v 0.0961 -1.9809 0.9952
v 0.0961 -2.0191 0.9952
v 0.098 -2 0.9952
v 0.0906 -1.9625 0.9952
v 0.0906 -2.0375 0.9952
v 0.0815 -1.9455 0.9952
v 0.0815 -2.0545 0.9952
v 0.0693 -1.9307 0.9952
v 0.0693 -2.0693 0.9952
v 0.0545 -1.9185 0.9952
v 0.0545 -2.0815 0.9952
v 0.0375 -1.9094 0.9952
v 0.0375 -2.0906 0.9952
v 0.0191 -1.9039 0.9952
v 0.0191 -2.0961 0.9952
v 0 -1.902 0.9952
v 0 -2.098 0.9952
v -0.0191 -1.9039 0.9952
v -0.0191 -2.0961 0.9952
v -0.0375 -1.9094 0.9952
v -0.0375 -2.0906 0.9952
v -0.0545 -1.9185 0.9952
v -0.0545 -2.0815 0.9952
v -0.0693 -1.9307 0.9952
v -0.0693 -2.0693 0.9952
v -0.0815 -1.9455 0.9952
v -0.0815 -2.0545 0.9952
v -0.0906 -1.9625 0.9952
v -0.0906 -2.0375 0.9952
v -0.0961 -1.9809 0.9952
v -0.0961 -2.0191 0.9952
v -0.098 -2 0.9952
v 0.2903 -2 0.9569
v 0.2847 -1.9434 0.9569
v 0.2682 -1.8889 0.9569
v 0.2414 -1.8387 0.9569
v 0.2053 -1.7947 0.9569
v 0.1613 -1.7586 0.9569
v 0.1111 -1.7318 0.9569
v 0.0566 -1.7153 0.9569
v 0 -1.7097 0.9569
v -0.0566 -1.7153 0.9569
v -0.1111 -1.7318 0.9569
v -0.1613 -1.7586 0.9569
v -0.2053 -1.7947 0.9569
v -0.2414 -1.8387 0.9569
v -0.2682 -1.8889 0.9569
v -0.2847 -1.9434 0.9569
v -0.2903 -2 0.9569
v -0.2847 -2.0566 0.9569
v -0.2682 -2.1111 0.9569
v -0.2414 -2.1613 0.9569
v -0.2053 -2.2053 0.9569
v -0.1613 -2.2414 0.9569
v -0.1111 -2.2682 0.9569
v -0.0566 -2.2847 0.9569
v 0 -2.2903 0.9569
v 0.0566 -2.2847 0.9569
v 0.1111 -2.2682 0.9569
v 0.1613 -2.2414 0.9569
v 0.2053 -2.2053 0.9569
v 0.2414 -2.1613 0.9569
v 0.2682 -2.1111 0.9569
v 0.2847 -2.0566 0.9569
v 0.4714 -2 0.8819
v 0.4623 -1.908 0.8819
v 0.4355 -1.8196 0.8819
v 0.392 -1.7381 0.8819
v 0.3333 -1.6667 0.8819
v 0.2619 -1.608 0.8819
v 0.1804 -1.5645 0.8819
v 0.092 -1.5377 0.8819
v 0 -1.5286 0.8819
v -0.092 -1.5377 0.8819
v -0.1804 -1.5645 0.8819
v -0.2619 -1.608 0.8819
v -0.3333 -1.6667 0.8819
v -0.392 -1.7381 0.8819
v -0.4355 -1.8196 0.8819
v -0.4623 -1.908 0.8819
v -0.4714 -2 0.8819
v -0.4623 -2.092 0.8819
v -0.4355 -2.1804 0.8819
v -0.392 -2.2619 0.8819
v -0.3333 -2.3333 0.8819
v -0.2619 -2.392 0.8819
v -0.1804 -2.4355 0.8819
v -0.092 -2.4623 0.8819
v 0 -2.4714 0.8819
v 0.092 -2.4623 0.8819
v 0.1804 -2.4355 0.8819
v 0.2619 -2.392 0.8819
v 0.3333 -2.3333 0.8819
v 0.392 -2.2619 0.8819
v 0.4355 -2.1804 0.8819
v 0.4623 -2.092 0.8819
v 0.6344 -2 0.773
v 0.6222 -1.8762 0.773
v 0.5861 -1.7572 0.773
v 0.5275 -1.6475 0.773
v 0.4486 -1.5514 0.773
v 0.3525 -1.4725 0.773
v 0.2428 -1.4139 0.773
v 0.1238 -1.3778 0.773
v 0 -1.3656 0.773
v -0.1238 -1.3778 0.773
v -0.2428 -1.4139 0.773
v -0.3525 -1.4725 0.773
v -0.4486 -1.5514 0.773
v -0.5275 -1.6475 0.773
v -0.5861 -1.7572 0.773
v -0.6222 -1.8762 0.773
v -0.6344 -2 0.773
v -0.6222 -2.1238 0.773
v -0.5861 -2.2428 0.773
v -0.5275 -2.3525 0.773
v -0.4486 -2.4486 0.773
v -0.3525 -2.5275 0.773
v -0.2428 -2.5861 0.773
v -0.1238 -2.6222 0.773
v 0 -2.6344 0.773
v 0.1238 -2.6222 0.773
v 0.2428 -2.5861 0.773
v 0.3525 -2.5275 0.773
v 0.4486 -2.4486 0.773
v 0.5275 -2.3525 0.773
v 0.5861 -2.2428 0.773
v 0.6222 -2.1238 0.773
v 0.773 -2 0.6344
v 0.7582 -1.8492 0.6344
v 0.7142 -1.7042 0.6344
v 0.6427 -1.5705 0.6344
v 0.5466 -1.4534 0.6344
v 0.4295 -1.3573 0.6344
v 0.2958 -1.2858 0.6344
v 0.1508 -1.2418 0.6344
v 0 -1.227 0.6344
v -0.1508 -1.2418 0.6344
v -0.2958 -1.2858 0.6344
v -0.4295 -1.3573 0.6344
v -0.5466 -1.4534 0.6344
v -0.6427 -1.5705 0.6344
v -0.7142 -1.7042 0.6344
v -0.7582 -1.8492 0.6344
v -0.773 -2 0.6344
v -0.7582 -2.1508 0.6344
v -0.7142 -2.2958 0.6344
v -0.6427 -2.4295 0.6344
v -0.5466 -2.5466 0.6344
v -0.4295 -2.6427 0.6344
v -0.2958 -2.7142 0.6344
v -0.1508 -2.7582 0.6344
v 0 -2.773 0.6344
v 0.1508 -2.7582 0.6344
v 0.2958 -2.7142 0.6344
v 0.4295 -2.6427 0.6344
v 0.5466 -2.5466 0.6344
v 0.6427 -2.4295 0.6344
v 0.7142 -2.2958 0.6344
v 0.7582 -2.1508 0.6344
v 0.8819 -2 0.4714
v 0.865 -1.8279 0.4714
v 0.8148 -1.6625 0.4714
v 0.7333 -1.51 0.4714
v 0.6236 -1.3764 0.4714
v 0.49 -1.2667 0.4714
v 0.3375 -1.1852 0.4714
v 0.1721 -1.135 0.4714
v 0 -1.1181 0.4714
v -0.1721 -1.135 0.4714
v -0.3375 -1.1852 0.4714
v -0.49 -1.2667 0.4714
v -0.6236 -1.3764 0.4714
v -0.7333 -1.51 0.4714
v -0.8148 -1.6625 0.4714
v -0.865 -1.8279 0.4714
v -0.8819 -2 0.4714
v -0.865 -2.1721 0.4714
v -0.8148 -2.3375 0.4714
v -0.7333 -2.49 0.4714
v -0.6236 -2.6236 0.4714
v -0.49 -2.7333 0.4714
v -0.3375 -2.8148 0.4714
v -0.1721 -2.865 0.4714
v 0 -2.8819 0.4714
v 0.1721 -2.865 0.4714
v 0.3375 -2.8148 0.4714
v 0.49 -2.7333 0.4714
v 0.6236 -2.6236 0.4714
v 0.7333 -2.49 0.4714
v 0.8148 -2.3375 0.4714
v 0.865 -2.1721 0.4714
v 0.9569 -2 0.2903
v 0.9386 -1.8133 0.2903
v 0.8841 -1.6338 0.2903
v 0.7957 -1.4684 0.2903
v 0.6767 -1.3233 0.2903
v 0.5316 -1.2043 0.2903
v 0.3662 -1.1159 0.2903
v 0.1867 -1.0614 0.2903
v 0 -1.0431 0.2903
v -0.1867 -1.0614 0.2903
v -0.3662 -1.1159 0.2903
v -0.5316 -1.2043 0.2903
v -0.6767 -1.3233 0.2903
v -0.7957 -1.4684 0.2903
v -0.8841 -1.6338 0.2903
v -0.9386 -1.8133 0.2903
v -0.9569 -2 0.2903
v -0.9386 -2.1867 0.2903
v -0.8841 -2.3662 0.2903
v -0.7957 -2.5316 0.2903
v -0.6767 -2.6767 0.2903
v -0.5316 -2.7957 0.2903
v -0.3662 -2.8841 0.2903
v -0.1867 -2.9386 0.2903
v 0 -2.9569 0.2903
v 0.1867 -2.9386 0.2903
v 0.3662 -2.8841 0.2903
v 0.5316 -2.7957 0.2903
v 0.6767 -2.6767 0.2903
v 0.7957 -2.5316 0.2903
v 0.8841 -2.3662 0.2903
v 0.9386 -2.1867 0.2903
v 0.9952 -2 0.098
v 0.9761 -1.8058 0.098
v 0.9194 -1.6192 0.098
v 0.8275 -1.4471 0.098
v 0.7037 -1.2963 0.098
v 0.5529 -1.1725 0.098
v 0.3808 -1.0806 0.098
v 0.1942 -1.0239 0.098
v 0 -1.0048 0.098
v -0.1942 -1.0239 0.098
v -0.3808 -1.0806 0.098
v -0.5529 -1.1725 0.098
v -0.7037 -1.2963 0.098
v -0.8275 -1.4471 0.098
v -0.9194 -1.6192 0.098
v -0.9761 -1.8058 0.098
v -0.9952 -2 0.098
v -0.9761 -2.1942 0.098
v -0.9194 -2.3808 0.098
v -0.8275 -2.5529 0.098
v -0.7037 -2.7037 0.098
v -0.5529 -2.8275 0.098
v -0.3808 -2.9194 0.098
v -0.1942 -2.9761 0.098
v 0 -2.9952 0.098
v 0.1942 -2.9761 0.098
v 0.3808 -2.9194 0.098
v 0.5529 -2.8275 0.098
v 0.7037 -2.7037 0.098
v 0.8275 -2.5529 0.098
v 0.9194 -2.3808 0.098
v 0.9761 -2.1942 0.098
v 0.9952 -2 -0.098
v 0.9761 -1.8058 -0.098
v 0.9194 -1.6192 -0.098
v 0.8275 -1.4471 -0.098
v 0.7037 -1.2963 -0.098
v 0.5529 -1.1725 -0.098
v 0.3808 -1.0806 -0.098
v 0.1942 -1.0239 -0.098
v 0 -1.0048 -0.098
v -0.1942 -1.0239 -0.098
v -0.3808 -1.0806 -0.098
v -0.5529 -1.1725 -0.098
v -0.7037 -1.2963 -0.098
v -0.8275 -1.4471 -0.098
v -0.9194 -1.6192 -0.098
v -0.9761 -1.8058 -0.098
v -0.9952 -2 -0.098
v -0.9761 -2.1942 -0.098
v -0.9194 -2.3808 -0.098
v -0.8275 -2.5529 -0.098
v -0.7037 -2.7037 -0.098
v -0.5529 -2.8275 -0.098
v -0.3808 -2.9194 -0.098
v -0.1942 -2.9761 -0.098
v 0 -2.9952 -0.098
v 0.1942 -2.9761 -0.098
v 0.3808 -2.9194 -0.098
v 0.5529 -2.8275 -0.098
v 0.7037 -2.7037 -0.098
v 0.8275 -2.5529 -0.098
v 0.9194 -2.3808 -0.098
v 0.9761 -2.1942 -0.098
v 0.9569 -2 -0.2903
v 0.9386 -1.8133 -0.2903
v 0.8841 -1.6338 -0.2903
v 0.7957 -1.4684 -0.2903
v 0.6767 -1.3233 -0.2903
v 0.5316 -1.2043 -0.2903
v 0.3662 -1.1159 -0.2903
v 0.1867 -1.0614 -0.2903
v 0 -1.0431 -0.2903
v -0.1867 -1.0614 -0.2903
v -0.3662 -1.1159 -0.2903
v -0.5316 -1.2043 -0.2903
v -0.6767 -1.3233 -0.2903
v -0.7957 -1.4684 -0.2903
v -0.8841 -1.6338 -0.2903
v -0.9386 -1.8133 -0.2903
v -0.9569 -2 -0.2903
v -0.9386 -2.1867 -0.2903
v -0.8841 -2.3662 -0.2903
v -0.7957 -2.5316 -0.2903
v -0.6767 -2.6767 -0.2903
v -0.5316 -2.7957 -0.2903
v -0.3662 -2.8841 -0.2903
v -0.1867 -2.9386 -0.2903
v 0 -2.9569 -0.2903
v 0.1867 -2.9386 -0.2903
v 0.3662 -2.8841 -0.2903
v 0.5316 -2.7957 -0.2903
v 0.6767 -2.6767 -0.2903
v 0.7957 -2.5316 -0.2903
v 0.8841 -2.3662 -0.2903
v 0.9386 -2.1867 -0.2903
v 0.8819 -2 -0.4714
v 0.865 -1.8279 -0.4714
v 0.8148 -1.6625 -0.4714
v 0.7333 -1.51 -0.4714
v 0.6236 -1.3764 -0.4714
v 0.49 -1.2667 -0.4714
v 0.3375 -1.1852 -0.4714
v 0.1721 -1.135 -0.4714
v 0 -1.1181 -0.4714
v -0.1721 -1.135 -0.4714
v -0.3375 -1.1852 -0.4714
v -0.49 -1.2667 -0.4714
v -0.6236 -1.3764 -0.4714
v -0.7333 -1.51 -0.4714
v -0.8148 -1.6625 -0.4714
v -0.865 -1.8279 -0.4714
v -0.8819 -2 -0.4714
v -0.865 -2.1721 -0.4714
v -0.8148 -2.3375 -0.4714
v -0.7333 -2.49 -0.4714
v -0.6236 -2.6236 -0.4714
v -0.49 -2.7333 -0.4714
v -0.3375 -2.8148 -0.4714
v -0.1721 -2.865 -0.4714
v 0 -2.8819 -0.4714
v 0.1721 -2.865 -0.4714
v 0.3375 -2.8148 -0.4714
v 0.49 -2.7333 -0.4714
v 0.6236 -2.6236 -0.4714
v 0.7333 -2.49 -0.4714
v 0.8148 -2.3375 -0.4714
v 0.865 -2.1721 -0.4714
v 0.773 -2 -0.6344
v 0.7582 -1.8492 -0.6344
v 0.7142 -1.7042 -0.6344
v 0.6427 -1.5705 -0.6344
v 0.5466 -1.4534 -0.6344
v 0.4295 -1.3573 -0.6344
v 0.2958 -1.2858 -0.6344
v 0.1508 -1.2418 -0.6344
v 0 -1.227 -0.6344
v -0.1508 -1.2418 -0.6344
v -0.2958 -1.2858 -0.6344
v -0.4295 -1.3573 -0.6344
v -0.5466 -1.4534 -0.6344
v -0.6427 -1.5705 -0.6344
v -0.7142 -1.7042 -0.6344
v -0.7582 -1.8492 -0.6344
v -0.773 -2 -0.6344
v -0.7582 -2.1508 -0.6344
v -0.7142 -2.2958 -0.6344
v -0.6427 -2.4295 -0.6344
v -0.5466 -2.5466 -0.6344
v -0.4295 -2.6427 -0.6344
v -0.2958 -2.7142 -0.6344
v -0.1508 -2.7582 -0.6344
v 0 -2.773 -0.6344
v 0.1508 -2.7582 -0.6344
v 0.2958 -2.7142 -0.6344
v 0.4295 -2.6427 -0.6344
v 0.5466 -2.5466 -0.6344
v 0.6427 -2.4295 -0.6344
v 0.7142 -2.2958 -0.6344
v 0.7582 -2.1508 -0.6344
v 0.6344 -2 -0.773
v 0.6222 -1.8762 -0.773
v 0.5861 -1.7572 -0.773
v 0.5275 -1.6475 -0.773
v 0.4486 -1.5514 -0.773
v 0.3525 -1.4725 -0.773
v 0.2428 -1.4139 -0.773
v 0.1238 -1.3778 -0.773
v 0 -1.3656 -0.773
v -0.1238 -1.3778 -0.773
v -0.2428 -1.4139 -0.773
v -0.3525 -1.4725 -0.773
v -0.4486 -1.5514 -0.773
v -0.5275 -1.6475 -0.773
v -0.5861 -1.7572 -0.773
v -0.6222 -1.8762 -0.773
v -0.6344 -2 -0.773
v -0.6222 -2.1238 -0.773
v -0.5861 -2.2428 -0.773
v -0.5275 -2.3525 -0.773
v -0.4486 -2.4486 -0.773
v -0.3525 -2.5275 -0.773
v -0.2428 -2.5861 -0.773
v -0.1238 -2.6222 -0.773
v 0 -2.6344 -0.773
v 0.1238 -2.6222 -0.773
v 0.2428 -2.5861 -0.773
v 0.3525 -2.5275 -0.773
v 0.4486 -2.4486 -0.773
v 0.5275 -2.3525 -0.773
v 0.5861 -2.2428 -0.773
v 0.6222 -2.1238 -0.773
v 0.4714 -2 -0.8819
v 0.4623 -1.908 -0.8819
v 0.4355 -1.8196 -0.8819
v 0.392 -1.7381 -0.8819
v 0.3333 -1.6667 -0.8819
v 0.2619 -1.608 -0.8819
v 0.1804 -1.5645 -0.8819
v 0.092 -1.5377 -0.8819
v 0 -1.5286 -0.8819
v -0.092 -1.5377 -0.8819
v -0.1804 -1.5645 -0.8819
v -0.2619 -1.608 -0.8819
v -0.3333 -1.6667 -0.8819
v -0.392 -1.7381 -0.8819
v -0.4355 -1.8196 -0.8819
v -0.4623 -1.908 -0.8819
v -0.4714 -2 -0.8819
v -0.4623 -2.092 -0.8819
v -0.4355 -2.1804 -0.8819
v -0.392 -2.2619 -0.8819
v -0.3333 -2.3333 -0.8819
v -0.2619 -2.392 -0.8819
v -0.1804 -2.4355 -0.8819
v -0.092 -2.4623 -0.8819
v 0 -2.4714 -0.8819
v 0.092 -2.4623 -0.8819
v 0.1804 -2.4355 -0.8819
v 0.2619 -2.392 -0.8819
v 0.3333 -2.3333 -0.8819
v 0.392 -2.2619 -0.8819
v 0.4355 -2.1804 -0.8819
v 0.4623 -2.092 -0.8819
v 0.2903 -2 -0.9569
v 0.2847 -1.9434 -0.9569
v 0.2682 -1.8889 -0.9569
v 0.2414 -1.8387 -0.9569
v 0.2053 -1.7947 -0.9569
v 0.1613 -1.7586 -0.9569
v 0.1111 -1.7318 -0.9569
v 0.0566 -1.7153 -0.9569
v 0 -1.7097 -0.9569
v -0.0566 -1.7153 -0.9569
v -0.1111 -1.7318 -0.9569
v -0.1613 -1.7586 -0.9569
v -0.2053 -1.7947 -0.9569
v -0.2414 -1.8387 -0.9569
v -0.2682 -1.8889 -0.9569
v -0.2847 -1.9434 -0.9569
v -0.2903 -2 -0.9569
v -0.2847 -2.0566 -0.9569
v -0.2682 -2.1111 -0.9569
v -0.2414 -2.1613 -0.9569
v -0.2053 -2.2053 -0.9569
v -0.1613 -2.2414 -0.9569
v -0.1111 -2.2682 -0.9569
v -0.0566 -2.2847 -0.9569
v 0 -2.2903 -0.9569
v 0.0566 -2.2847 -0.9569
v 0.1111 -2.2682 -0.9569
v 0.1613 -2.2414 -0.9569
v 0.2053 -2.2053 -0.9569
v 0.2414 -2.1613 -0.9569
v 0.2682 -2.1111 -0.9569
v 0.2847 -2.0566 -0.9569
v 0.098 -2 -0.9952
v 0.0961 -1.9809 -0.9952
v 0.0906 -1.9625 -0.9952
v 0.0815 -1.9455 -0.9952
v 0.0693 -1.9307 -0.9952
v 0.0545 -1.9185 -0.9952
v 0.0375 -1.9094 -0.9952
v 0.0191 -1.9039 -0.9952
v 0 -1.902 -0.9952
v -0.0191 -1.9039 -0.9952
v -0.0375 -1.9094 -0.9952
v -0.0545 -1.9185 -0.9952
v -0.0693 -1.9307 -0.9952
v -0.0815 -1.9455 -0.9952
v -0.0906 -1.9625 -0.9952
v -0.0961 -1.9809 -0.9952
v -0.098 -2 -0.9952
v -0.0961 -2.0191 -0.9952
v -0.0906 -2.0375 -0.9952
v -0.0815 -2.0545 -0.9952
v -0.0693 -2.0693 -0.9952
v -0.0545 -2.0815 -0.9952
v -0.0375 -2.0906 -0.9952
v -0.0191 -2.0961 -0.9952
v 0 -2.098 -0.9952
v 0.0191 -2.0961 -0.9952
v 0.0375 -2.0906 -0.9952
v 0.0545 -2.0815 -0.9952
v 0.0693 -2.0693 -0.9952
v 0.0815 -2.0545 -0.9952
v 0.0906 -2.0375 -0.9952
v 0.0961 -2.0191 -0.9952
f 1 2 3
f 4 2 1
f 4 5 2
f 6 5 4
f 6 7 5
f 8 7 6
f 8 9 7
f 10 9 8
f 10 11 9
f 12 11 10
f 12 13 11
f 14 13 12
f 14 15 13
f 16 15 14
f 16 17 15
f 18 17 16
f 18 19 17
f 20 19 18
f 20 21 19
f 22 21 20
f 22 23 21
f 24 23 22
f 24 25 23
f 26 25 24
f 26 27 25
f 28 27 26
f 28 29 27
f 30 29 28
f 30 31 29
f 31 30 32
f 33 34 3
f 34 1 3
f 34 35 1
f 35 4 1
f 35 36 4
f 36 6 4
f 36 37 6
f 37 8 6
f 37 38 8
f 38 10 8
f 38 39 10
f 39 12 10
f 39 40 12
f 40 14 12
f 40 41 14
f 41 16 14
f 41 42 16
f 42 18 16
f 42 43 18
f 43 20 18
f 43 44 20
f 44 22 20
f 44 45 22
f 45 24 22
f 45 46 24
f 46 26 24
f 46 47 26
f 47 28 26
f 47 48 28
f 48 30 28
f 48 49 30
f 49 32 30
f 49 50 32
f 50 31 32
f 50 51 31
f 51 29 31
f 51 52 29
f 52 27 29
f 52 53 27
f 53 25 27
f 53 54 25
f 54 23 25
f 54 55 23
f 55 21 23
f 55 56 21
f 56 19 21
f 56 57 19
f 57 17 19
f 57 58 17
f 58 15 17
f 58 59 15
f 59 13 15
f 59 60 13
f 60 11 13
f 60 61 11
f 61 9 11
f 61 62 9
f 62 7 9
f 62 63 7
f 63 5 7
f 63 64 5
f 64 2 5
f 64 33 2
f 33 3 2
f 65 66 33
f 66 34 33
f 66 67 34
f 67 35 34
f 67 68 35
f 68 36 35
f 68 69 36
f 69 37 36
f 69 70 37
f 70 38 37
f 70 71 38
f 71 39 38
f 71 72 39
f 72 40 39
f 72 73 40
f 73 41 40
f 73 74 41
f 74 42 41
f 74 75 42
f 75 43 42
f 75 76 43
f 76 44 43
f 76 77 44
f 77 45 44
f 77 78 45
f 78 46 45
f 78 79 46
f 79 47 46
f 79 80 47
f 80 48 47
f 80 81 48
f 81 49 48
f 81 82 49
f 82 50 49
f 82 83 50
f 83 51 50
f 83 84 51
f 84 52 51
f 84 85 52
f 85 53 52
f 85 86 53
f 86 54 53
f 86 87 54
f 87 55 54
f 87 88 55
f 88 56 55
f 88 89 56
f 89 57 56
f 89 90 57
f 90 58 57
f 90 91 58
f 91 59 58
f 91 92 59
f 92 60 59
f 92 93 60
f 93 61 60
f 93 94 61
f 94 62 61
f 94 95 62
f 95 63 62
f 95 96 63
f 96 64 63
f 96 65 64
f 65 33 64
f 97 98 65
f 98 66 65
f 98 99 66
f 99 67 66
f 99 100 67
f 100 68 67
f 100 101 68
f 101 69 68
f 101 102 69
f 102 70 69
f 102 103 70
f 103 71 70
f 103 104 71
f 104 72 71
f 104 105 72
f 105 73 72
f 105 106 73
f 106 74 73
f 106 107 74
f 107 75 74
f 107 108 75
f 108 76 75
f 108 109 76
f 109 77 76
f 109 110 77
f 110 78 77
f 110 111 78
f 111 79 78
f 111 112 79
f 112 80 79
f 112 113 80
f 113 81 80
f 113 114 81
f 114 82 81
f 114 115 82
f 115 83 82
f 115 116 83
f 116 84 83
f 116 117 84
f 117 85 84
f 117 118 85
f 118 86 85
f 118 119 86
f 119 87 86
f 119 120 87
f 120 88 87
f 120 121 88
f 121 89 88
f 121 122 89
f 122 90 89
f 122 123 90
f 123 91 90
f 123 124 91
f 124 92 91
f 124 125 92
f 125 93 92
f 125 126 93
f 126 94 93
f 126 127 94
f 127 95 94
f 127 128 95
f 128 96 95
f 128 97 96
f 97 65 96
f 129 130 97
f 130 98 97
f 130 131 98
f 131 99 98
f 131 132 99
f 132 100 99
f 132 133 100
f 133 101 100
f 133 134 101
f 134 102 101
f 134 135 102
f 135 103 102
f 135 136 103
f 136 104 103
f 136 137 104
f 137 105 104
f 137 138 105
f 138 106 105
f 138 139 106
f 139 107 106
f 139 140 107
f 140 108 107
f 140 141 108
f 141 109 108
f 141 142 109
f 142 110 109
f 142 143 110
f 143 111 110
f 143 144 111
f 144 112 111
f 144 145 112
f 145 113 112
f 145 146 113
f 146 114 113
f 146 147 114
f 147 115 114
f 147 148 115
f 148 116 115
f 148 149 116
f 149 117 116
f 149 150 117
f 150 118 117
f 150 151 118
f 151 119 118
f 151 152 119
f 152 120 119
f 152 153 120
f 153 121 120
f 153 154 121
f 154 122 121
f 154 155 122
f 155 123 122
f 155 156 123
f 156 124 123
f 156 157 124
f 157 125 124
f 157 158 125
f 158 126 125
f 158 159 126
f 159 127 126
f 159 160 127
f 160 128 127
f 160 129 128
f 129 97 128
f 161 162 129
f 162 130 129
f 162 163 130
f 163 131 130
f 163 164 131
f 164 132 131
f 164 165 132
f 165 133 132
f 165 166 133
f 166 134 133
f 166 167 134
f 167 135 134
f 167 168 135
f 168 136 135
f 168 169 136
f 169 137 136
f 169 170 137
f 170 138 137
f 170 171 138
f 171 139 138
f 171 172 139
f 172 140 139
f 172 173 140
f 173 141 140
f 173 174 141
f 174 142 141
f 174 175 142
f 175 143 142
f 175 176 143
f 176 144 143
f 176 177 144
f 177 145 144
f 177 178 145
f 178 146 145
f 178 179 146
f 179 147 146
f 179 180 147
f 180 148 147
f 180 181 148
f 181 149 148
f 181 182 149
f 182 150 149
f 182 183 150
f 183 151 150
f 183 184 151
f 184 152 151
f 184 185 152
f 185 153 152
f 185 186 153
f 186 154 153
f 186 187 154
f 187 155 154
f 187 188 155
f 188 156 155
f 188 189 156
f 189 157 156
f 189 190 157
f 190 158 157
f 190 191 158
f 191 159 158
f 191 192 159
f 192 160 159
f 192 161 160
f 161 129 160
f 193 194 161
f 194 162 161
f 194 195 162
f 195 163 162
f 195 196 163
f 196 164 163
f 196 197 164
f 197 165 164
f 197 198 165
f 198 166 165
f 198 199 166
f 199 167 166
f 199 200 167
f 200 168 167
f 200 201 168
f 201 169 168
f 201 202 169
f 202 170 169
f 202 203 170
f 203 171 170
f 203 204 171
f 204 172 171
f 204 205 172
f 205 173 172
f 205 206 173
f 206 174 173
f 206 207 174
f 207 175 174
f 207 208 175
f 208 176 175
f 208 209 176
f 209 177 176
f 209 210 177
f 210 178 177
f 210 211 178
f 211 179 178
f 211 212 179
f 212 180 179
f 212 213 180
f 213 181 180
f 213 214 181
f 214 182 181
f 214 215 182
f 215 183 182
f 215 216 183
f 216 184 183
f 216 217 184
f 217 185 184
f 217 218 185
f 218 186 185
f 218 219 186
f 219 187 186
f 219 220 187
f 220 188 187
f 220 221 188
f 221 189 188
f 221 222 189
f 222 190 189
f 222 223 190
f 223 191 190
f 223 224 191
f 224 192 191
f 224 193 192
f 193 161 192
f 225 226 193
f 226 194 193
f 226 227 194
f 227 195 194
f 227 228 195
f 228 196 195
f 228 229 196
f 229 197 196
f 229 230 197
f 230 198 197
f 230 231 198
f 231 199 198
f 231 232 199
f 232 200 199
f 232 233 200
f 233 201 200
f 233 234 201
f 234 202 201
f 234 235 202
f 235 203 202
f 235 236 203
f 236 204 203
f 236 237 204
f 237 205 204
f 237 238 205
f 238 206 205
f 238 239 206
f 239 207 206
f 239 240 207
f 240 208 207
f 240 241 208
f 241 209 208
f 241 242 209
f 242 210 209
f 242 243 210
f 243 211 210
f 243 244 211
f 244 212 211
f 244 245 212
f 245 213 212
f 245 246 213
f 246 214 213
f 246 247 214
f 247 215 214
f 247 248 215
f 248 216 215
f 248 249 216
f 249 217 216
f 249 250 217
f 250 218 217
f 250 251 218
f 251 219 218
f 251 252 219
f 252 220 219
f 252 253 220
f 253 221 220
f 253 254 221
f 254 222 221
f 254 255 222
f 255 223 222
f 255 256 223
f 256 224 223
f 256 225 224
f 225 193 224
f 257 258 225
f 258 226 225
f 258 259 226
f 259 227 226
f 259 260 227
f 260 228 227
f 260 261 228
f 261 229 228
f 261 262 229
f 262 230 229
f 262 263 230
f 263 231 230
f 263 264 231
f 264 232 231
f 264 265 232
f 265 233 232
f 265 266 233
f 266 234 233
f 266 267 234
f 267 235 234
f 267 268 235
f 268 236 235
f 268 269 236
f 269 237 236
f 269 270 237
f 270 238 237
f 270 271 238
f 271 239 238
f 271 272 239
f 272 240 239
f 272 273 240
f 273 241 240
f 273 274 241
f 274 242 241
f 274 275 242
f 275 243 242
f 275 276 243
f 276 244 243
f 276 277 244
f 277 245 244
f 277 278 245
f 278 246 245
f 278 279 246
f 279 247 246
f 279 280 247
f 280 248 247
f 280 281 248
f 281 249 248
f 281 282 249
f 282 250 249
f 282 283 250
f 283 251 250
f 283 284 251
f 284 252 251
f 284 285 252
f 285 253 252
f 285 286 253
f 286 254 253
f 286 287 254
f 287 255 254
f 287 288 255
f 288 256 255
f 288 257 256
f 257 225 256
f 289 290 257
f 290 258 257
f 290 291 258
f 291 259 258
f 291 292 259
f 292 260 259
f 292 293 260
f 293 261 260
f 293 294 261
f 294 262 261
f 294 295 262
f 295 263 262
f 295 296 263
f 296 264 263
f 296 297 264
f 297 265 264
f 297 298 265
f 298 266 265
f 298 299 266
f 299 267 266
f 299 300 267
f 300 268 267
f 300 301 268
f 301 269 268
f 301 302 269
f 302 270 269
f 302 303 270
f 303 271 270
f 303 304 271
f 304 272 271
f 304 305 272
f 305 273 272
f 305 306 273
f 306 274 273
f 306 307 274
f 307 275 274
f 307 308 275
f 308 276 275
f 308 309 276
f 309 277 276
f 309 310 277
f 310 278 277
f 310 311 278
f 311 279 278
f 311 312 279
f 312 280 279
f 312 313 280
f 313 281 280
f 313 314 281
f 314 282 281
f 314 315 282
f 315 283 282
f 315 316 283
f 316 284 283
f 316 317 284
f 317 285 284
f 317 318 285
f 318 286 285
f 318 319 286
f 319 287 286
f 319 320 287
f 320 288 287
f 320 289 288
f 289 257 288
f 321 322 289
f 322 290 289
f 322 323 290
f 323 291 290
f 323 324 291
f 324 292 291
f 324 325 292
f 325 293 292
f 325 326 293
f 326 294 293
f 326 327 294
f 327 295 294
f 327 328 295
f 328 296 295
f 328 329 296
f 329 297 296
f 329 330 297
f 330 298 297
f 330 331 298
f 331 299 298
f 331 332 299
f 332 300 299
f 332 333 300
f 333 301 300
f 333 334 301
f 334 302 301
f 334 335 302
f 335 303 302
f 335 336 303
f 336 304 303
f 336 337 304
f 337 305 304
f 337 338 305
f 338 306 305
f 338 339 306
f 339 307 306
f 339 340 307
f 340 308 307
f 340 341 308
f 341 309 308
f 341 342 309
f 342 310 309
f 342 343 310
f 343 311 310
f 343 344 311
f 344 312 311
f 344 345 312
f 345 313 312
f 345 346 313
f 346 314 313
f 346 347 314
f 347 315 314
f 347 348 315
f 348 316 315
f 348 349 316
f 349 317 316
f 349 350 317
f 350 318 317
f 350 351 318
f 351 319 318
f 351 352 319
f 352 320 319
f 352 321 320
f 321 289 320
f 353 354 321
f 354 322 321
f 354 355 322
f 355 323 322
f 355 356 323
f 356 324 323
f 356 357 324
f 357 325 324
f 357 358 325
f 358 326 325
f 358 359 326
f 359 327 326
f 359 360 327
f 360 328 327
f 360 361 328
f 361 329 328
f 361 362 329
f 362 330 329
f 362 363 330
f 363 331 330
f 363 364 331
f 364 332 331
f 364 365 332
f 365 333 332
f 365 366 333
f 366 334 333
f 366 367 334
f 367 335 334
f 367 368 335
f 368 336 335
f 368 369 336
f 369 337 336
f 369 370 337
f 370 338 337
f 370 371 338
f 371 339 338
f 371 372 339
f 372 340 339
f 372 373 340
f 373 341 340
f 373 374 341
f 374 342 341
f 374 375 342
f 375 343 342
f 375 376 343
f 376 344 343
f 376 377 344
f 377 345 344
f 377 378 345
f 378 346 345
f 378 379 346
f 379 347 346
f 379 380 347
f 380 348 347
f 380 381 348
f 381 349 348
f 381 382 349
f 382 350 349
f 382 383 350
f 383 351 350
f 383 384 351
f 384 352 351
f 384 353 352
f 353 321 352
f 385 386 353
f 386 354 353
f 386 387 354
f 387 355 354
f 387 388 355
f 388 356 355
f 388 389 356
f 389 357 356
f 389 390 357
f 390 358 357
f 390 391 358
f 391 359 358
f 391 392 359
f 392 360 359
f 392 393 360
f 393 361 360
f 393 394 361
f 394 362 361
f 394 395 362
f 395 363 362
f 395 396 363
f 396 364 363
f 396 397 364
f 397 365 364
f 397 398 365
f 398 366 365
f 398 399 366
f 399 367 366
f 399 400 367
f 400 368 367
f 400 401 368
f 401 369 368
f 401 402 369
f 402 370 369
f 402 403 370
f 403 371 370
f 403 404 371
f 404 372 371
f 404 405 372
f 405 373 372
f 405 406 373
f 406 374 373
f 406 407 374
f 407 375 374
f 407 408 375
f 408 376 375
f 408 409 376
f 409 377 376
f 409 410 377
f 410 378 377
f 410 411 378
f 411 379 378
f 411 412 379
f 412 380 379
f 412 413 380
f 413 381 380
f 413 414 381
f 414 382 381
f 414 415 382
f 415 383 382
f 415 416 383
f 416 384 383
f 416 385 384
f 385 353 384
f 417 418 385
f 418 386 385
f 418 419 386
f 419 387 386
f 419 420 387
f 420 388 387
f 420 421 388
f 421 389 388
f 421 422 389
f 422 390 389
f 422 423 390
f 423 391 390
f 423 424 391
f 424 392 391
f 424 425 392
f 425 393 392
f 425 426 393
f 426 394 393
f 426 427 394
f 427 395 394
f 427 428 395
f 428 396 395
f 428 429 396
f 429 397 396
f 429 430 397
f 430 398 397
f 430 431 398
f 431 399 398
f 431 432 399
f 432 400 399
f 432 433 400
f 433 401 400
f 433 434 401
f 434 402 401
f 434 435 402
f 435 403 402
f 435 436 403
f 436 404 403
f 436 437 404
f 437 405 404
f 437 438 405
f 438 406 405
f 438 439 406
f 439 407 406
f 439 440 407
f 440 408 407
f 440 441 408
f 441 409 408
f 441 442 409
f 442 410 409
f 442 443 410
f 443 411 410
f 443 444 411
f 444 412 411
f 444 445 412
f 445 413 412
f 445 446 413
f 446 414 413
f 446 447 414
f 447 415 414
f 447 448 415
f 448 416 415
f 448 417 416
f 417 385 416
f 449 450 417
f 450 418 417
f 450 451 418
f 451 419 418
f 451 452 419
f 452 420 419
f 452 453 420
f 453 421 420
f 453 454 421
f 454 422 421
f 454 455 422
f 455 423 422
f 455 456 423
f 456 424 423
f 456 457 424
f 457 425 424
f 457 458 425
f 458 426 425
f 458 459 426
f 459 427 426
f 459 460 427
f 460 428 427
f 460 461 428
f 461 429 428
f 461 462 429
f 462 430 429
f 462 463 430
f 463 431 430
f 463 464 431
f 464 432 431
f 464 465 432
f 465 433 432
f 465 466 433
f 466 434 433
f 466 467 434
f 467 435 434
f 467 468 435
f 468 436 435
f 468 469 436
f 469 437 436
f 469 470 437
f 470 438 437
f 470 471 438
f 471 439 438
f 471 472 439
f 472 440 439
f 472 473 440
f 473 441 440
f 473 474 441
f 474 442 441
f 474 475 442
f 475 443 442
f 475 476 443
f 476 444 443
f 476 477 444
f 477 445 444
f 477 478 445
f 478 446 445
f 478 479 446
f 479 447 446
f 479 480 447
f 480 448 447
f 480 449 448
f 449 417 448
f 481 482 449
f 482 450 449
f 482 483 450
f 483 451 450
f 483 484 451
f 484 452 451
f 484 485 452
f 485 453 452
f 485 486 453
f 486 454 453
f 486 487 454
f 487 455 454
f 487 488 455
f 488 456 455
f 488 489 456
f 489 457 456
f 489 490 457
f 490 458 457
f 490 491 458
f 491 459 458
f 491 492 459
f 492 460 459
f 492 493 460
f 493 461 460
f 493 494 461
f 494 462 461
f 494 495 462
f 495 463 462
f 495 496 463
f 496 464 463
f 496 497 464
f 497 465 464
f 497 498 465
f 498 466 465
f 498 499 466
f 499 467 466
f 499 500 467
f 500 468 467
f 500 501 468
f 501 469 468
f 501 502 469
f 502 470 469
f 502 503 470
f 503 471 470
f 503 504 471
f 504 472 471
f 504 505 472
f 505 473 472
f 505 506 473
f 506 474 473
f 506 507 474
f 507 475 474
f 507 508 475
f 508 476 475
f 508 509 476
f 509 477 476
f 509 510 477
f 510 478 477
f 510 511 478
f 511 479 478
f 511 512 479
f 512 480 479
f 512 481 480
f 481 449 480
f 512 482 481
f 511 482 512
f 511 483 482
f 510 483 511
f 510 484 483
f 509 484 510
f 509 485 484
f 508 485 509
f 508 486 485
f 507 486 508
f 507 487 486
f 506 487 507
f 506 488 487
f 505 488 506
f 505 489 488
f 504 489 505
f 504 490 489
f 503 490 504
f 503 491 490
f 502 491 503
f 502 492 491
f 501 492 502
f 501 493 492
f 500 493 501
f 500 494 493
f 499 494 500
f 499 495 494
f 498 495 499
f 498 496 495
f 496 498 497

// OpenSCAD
$fn = 32;
$vpd = ((abs(sin(($t * 360))) * 10) + 5);
$vpt = [0, -1, 0];
$vpr = [63, 0, ($t * 360)];
$vpf = 25;
/* [Colors] */
//The color of the cube
cube_color = "blue"; //[red, green, blue]
/* [Animation] */
//Animation speed factor
anim_factor = 1; //[1:0.5:10]

union() {
	color(alpha = 1.0000000000, c = cube_color) {
		cube(center = true, size = abs(sin((($t * 360) * anim_factor))));
	}
	translate(v = [0, -2, 0]) {
		color(alpha = 1.0000000000, c = cube_color) {
			sphere(r = abs(sin(((($t * 360) * anim_factor) - 90))));
		}
	}
}
